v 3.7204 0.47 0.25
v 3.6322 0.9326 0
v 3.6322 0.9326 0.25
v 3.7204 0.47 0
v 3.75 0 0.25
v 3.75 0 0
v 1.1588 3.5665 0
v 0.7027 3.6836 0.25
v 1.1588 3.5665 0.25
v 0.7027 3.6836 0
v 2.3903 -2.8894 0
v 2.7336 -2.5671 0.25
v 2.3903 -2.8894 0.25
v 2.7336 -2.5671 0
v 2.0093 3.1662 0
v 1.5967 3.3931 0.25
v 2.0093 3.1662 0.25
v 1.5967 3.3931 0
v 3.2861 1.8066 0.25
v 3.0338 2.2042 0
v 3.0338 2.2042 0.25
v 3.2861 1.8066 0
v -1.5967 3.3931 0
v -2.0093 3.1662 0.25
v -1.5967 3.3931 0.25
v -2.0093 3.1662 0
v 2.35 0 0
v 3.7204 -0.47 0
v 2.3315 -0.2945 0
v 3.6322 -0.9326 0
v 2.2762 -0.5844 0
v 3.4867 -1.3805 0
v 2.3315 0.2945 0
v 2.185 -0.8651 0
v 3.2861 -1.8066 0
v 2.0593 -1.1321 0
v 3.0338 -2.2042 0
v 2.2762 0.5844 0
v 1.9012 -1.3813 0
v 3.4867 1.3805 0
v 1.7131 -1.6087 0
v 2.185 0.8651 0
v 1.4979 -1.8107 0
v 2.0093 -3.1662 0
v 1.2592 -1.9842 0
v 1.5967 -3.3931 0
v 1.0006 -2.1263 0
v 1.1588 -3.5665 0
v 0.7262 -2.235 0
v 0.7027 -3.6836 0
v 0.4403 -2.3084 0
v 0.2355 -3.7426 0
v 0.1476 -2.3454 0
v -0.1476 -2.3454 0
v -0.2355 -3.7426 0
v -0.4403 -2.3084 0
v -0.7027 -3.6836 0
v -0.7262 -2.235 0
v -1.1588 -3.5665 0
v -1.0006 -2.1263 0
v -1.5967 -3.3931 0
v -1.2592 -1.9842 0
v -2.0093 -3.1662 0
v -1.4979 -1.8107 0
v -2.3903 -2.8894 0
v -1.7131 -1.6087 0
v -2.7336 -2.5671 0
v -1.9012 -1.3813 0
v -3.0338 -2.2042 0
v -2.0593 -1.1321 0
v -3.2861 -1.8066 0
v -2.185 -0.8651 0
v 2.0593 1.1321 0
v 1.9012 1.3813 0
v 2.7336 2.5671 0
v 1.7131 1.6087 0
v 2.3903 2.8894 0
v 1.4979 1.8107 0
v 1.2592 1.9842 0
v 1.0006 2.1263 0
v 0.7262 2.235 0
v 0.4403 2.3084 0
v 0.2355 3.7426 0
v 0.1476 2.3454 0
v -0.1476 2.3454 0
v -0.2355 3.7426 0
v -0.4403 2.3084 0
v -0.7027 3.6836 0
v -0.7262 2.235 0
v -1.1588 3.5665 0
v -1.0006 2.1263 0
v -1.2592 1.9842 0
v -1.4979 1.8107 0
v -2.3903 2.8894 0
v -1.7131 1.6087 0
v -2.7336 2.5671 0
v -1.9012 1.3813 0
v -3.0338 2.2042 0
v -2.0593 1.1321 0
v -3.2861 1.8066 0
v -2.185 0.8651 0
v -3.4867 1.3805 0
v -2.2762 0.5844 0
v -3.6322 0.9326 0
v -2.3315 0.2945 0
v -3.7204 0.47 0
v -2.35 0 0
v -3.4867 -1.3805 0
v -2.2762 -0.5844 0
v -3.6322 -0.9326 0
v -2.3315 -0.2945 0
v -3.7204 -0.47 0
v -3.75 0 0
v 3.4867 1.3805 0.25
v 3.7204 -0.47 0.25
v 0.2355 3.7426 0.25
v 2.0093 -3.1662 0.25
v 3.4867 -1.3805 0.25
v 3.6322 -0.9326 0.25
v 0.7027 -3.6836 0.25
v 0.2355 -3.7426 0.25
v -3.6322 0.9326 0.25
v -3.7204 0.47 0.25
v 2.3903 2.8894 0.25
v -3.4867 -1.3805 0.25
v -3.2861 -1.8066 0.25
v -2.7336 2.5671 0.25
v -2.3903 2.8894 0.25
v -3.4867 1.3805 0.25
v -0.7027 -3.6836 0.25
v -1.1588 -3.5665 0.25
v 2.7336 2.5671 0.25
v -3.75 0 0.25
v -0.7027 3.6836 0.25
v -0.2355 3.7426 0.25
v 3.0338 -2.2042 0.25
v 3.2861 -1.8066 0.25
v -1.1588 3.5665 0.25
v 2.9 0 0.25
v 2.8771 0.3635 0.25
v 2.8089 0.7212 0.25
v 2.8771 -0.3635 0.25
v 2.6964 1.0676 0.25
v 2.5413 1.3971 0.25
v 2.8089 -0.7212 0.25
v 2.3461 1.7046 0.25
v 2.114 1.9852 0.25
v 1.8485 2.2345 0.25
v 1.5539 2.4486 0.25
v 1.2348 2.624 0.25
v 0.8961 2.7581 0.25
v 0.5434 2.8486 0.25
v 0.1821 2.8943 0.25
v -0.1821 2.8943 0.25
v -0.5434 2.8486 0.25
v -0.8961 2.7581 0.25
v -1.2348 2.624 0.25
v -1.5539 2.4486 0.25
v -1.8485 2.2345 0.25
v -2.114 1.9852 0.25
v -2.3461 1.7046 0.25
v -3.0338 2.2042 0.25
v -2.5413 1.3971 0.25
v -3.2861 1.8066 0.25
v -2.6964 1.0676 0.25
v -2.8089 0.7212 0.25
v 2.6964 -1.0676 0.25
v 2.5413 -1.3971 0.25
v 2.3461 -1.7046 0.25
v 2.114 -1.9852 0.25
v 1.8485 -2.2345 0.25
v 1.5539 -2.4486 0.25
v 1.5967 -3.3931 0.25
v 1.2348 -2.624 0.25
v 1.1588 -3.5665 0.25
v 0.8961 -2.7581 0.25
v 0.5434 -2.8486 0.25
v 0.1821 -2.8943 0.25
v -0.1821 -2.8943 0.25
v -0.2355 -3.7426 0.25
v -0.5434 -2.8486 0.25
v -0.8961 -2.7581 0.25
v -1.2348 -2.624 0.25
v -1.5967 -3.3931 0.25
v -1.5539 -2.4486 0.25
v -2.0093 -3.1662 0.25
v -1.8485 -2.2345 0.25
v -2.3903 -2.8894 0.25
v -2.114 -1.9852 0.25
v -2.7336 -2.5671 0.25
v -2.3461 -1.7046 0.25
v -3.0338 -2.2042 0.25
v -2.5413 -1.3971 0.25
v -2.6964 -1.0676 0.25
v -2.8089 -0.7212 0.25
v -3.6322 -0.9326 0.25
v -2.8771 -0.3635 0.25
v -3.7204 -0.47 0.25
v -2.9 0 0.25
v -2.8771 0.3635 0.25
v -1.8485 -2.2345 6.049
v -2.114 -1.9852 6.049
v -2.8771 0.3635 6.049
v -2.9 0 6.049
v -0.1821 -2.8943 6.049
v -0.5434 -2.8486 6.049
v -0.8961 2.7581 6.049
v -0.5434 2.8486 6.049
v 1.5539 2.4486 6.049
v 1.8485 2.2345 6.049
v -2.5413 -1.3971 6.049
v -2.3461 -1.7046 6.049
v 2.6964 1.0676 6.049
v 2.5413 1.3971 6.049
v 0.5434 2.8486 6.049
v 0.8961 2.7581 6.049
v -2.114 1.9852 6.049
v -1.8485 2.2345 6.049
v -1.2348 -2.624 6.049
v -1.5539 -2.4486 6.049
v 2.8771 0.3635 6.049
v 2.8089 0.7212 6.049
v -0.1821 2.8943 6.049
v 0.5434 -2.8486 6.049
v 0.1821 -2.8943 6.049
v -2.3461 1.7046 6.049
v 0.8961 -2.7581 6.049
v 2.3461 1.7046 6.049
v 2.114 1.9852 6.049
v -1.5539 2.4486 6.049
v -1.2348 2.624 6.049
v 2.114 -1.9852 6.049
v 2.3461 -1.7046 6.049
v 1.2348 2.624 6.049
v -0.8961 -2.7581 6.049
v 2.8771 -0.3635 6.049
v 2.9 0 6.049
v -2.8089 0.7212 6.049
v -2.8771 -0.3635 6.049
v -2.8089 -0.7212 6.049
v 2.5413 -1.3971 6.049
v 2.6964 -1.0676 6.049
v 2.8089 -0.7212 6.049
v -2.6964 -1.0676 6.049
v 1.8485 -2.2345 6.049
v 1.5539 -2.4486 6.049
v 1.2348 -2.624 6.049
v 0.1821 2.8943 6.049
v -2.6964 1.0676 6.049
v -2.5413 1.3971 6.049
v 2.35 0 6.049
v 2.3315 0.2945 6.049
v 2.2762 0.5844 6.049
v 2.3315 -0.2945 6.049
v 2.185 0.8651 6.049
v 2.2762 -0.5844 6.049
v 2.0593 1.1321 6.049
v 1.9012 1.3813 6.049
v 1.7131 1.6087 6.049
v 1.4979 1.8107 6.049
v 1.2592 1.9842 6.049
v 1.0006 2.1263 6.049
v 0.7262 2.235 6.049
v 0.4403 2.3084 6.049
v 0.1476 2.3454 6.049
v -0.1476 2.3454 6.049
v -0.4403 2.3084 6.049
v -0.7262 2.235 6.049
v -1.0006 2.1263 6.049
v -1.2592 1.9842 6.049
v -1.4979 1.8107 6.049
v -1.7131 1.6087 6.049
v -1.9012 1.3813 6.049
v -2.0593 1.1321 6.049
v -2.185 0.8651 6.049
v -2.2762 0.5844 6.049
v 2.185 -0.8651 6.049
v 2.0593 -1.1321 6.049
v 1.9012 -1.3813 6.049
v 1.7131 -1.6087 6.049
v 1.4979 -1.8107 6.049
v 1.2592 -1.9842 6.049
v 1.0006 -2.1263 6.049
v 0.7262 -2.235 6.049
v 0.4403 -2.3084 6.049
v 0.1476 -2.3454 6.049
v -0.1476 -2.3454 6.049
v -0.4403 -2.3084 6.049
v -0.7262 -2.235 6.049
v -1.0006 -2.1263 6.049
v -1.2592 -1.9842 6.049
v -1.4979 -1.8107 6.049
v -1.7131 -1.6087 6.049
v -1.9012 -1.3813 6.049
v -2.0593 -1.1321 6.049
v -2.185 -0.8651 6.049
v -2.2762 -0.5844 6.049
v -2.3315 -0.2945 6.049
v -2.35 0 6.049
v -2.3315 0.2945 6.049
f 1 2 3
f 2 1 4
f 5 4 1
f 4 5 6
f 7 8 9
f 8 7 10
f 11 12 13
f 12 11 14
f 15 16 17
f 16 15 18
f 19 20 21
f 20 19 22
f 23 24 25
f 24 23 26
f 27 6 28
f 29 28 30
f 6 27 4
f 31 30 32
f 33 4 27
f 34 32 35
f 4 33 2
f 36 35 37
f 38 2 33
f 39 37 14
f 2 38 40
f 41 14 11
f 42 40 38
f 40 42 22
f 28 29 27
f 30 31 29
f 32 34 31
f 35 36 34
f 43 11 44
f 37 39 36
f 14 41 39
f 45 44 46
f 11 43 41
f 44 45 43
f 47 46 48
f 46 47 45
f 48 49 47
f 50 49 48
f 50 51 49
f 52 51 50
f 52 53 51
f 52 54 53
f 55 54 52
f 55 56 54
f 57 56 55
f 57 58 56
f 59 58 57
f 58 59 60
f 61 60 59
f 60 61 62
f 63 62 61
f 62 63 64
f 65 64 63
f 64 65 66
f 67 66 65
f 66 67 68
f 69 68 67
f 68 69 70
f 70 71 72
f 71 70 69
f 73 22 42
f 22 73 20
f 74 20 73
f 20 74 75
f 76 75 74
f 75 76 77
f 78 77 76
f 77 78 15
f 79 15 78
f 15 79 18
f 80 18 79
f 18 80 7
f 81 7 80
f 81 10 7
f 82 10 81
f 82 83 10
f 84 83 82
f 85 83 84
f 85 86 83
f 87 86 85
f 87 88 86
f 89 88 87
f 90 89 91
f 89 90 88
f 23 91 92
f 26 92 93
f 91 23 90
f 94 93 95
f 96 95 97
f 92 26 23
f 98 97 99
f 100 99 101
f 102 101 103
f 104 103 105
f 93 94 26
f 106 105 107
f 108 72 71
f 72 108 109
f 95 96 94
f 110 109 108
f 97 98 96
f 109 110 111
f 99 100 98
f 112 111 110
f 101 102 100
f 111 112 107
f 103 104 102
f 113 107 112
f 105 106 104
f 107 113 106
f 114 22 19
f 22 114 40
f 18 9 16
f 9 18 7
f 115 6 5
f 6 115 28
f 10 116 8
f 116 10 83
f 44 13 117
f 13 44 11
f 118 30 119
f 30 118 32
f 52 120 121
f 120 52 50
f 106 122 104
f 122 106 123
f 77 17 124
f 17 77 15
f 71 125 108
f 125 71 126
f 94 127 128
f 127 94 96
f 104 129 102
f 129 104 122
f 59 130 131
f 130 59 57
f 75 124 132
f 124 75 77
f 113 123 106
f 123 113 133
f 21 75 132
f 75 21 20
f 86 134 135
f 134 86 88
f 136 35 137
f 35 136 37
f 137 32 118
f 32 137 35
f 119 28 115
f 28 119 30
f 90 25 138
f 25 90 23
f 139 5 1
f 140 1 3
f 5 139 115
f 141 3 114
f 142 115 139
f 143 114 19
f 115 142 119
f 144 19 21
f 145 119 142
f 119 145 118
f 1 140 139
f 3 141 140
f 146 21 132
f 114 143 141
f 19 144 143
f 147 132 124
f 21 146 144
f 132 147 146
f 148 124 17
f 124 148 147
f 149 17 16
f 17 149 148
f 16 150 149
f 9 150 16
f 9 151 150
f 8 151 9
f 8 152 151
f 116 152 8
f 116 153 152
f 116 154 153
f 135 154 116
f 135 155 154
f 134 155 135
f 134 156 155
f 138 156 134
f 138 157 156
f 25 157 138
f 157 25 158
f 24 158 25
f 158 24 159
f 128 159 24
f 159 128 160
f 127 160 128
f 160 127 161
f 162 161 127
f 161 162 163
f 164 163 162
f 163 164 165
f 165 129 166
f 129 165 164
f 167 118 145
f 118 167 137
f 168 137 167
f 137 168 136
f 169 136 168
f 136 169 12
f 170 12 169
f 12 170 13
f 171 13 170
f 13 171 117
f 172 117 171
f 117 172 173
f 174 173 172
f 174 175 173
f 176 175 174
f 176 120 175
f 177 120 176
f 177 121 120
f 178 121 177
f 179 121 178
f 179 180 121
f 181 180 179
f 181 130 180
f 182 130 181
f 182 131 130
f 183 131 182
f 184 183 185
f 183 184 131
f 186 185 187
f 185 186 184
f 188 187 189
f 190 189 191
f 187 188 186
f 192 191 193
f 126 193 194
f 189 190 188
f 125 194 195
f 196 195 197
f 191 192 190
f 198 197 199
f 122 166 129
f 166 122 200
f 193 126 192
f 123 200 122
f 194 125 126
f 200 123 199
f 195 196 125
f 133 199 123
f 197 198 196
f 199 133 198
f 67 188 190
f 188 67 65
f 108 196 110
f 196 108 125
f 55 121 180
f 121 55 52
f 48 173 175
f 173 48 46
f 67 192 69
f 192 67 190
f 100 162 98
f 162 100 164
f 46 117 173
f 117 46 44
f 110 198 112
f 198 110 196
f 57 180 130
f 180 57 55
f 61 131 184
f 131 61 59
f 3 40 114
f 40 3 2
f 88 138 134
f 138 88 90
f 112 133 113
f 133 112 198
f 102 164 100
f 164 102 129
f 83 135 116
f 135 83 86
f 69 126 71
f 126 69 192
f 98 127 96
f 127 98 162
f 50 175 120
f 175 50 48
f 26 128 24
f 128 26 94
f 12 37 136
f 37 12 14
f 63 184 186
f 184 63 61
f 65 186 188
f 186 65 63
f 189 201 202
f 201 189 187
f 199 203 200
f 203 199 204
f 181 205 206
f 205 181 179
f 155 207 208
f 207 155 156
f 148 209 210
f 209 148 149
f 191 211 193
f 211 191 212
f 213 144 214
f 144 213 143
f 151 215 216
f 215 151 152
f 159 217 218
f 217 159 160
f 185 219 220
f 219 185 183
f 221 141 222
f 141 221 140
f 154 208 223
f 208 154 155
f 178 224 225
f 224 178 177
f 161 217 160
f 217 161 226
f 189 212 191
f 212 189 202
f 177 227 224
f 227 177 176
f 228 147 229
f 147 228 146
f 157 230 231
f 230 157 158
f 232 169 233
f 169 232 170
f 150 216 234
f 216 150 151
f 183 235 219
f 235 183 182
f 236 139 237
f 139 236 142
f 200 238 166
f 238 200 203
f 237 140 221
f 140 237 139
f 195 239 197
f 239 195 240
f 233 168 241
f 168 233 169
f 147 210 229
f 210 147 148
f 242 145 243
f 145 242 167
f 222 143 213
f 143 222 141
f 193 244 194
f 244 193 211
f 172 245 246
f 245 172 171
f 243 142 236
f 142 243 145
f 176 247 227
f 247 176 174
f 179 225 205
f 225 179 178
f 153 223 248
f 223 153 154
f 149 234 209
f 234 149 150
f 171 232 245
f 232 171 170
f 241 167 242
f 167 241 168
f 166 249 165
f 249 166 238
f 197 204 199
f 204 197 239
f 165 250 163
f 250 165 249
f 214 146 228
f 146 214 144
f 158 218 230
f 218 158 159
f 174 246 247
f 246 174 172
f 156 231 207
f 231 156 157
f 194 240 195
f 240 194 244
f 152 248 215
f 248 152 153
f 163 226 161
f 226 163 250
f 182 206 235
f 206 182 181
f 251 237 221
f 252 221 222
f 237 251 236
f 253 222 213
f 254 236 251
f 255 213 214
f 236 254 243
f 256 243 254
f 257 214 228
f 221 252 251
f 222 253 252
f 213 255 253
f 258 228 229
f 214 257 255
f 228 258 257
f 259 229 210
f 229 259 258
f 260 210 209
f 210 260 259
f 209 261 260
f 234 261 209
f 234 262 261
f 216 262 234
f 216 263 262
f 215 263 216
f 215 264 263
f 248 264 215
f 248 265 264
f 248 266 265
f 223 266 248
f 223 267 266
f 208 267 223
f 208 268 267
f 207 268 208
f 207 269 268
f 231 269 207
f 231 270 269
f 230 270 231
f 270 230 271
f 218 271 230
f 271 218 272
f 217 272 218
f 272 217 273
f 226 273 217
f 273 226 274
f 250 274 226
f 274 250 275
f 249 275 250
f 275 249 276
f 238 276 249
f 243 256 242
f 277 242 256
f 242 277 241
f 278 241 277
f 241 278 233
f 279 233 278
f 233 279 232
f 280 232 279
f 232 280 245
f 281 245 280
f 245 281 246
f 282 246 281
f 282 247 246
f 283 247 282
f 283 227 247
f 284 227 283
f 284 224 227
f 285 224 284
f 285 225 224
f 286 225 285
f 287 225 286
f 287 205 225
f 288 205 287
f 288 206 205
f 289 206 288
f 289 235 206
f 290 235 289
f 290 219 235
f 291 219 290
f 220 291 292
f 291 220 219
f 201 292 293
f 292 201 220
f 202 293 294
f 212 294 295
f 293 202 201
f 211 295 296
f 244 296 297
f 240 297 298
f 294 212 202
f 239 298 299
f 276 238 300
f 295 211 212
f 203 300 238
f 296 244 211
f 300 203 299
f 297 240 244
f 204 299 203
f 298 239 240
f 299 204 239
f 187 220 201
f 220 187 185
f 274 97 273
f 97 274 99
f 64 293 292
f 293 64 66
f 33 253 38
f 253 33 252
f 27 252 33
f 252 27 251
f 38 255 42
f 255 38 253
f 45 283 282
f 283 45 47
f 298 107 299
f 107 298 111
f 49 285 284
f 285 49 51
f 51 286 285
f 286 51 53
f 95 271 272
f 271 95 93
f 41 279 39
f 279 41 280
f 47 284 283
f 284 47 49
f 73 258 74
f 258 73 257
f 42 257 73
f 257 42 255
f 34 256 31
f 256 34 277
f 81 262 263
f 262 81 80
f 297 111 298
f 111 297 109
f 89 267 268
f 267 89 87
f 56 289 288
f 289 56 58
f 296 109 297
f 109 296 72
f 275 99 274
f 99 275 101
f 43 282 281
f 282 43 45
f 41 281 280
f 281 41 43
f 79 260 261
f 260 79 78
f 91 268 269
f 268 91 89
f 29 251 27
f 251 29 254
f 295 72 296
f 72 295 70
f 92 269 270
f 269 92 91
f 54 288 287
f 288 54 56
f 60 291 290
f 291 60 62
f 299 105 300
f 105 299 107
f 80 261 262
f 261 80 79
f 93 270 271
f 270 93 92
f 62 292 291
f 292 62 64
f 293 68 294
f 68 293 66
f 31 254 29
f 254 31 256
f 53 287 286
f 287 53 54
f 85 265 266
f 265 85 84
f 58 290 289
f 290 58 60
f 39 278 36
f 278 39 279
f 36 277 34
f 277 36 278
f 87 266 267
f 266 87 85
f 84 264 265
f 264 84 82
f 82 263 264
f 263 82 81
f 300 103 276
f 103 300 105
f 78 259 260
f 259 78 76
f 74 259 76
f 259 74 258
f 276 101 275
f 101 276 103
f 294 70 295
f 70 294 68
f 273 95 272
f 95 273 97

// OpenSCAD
// Radial Bearing Fit Sleeve

tolerance=0.1;
shaftDiameter=4.5;
bearingInsideDiameter=6;
bearingThickness=6;
sleeveRecess=0.2;
retainingRidgeWidth=0.75;
retainingRidgeThickness=0.25;
overlap=0.001;

difference() {
    union() {
        // retaining ridge
        cylinder(d=bearingInsideDiameter+retainingRidgeWidth*2, 
                h=retainingRidgeThickness, $fn=50);
        translate([0,0,retainingRidgeThickness-overlap]) 
            cylinder(d=bearingInsideDiameter-tolerance*2, 
                h=bearingThickness-sleeveRecess, $fn=50);
    }
    translate([0,0,-overlap]) 
        cylinder(d=shaftDiameter+tolerance*2, 
            h=bearingThickness+retainingRidgeThickness+overlap*2, 
            $fn=50);
} 
